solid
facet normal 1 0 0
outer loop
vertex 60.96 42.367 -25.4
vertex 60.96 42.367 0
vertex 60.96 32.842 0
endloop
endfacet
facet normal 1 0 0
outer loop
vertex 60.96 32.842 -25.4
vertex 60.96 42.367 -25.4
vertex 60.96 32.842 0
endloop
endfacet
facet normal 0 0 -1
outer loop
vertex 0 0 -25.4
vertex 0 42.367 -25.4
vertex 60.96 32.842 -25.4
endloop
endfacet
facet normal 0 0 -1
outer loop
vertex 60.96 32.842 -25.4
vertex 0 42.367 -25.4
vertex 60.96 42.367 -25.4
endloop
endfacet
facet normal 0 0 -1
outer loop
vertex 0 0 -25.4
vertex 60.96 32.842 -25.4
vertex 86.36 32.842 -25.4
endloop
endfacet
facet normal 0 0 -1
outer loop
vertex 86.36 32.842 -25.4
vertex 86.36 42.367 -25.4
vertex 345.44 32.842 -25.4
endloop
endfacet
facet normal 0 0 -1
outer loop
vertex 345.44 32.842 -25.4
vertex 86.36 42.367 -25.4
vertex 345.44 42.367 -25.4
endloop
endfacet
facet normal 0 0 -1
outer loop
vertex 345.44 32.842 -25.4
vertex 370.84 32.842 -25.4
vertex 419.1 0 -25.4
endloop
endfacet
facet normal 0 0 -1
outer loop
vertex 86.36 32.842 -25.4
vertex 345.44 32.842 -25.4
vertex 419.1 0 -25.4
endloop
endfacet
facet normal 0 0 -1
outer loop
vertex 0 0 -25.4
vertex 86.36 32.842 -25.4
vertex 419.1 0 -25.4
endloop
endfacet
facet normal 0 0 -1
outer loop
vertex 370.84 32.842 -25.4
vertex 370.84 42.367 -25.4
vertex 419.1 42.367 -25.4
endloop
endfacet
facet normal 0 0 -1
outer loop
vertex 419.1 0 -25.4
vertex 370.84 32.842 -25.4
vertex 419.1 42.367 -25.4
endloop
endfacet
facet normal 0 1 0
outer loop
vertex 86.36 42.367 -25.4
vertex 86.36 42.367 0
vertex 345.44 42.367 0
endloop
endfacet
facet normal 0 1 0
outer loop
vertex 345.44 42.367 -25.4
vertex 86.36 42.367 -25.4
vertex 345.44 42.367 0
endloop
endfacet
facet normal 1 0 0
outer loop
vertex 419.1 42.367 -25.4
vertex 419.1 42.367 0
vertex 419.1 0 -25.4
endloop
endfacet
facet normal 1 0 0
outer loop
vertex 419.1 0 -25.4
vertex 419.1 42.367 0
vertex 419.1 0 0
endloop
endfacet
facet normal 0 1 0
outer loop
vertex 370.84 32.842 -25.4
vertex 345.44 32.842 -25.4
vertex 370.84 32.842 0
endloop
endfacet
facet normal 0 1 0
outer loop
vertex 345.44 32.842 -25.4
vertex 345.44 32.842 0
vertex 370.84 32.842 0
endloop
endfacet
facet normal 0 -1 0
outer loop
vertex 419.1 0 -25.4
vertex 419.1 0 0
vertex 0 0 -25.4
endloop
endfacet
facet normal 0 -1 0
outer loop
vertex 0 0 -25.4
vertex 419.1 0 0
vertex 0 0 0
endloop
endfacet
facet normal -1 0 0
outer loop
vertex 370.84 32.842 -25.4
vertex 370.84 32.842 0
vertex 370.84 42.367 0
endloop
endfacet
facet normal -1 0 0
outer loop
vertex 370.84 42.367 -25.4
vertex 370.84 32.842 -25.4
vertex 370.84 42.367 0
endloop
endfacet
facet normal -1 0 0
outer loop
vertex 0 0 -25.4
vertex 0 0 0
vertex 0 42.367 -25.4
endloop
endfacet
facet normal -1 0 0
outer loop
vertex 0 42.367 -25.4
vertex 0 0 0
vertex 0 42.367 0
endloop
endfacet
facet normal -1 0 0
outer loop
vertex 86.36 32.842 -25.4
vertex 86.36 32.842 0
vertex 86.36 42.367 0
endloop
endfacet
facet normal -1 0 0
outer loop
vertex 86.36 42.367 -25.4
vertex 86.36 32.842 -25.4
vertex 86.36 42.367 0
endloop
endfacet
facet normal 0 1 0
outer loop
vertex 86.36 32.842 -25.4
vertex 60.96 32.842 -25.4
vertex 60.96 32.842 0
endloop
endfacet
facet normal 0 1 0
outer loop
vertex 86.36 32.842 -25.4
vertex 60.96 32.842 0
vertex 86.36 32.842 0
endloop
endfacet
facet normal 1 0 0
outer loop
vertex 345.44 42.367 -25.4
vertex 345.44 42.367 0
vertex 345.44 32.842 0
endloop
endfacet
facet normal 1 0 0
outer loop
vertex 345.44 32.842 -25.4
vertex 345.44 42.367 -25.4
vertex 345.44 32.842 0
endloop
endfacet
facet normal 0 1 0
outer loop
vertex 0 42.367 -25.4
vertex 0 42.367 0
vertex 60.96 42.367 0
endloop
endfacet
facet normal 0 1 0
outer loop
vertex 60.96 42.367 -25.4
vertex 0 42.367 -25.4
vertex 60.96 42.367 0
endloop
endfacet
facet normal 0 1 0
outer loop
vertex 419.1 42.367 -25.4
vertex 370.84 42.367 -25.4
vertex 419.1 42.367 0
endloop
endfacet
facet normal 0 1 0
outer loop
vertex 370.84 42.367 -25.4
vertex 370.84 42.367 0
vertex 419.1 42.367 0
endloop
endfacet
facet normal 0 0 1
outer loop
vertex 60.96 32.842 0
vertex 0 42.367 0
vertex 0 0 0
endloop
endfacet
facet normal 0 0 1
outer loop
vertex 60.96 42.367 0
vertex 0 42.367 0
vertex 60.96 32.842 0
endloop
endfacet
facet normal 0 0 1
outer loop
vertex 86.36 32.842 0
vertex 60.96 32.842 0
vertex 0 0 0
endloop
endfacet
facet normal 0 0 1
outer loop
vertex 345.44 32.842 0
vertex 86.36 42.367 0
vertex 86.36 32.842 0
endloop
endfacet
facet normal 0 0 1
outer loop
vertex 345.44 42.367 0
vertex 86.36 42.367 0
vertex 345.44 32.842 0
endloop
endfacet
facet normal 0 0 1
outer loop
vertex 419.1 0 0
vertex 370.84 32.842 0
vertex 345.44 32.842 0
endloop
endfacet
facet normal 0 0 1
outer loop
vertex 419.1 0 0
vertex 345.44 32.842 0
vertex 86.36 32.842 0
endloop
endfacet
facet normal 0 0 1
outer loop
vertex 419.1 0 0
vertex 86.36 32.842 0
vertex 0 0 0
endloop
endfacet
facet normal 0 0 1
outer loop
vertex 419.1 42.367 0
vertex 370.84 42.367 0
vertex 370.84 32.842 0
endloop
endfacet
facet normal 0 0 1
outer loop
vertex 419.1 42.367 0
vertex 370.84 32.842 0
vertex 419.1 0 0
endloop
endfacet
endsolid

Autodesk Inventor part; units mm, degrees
ref_plane "YZ Plane" through (0, 0, 0) normal (1, 0, 0) x (0, 1, 0)
ref_plane "XZ Plane" through (0, 0, 0) normal (0, 1, 0) x (-1, 0, 0)
ref_plane "XY Plane" through (0, 0, 0) normal (0, 0, 1) x (1, 0, 0)
sketch "Sketch1" plane through (0, 0, 0) normal (0, 0, 1) x (1, 0, 0)
  line L0 (0, 0) -> (0, 42.3672)
  line L1 (0, 42.3672) -> (60.96, 42.3672)
  line L2 (60.96, 42.3672) -> (60.96, 32.8422)
  line L3 (60.96, 32.8422) -> (86.36, 32.8422)
  line L4 (86.36, 32.8422) -> (86.36, 42.3672)
  line L5 (86.36, 42.3672) -> (345.44, 42.3672)
  line L6 (345.44, 42.3672) -> (345.44, 32.8422)
  line L7 (345.44, 32.8422) -> (370.84, 32.8422)
  line L8 (370.84, 32.8422) -> (370.84, 42.3672)
  line L9 (370.84, 42.3672) -> (419.1, 42.3672)
  line L10 (419.1, 42.3672) -> (419.1, 0)
  line L11 (419.1, 0) -> (0, 0)
  dimension "d0" = 42.3672
  dimension "d1" = 60.96
  dimension "d2" = 25.4
  dimension "d3" = 345.44
  dimension "d4" = 419.1
  dimension "d5" = 25.4
  dimension "d6" = 9.525
extrude "Extrusion1" add sketch "Sketch1" against normal blind 25.4
properties part number "mid spacer"
